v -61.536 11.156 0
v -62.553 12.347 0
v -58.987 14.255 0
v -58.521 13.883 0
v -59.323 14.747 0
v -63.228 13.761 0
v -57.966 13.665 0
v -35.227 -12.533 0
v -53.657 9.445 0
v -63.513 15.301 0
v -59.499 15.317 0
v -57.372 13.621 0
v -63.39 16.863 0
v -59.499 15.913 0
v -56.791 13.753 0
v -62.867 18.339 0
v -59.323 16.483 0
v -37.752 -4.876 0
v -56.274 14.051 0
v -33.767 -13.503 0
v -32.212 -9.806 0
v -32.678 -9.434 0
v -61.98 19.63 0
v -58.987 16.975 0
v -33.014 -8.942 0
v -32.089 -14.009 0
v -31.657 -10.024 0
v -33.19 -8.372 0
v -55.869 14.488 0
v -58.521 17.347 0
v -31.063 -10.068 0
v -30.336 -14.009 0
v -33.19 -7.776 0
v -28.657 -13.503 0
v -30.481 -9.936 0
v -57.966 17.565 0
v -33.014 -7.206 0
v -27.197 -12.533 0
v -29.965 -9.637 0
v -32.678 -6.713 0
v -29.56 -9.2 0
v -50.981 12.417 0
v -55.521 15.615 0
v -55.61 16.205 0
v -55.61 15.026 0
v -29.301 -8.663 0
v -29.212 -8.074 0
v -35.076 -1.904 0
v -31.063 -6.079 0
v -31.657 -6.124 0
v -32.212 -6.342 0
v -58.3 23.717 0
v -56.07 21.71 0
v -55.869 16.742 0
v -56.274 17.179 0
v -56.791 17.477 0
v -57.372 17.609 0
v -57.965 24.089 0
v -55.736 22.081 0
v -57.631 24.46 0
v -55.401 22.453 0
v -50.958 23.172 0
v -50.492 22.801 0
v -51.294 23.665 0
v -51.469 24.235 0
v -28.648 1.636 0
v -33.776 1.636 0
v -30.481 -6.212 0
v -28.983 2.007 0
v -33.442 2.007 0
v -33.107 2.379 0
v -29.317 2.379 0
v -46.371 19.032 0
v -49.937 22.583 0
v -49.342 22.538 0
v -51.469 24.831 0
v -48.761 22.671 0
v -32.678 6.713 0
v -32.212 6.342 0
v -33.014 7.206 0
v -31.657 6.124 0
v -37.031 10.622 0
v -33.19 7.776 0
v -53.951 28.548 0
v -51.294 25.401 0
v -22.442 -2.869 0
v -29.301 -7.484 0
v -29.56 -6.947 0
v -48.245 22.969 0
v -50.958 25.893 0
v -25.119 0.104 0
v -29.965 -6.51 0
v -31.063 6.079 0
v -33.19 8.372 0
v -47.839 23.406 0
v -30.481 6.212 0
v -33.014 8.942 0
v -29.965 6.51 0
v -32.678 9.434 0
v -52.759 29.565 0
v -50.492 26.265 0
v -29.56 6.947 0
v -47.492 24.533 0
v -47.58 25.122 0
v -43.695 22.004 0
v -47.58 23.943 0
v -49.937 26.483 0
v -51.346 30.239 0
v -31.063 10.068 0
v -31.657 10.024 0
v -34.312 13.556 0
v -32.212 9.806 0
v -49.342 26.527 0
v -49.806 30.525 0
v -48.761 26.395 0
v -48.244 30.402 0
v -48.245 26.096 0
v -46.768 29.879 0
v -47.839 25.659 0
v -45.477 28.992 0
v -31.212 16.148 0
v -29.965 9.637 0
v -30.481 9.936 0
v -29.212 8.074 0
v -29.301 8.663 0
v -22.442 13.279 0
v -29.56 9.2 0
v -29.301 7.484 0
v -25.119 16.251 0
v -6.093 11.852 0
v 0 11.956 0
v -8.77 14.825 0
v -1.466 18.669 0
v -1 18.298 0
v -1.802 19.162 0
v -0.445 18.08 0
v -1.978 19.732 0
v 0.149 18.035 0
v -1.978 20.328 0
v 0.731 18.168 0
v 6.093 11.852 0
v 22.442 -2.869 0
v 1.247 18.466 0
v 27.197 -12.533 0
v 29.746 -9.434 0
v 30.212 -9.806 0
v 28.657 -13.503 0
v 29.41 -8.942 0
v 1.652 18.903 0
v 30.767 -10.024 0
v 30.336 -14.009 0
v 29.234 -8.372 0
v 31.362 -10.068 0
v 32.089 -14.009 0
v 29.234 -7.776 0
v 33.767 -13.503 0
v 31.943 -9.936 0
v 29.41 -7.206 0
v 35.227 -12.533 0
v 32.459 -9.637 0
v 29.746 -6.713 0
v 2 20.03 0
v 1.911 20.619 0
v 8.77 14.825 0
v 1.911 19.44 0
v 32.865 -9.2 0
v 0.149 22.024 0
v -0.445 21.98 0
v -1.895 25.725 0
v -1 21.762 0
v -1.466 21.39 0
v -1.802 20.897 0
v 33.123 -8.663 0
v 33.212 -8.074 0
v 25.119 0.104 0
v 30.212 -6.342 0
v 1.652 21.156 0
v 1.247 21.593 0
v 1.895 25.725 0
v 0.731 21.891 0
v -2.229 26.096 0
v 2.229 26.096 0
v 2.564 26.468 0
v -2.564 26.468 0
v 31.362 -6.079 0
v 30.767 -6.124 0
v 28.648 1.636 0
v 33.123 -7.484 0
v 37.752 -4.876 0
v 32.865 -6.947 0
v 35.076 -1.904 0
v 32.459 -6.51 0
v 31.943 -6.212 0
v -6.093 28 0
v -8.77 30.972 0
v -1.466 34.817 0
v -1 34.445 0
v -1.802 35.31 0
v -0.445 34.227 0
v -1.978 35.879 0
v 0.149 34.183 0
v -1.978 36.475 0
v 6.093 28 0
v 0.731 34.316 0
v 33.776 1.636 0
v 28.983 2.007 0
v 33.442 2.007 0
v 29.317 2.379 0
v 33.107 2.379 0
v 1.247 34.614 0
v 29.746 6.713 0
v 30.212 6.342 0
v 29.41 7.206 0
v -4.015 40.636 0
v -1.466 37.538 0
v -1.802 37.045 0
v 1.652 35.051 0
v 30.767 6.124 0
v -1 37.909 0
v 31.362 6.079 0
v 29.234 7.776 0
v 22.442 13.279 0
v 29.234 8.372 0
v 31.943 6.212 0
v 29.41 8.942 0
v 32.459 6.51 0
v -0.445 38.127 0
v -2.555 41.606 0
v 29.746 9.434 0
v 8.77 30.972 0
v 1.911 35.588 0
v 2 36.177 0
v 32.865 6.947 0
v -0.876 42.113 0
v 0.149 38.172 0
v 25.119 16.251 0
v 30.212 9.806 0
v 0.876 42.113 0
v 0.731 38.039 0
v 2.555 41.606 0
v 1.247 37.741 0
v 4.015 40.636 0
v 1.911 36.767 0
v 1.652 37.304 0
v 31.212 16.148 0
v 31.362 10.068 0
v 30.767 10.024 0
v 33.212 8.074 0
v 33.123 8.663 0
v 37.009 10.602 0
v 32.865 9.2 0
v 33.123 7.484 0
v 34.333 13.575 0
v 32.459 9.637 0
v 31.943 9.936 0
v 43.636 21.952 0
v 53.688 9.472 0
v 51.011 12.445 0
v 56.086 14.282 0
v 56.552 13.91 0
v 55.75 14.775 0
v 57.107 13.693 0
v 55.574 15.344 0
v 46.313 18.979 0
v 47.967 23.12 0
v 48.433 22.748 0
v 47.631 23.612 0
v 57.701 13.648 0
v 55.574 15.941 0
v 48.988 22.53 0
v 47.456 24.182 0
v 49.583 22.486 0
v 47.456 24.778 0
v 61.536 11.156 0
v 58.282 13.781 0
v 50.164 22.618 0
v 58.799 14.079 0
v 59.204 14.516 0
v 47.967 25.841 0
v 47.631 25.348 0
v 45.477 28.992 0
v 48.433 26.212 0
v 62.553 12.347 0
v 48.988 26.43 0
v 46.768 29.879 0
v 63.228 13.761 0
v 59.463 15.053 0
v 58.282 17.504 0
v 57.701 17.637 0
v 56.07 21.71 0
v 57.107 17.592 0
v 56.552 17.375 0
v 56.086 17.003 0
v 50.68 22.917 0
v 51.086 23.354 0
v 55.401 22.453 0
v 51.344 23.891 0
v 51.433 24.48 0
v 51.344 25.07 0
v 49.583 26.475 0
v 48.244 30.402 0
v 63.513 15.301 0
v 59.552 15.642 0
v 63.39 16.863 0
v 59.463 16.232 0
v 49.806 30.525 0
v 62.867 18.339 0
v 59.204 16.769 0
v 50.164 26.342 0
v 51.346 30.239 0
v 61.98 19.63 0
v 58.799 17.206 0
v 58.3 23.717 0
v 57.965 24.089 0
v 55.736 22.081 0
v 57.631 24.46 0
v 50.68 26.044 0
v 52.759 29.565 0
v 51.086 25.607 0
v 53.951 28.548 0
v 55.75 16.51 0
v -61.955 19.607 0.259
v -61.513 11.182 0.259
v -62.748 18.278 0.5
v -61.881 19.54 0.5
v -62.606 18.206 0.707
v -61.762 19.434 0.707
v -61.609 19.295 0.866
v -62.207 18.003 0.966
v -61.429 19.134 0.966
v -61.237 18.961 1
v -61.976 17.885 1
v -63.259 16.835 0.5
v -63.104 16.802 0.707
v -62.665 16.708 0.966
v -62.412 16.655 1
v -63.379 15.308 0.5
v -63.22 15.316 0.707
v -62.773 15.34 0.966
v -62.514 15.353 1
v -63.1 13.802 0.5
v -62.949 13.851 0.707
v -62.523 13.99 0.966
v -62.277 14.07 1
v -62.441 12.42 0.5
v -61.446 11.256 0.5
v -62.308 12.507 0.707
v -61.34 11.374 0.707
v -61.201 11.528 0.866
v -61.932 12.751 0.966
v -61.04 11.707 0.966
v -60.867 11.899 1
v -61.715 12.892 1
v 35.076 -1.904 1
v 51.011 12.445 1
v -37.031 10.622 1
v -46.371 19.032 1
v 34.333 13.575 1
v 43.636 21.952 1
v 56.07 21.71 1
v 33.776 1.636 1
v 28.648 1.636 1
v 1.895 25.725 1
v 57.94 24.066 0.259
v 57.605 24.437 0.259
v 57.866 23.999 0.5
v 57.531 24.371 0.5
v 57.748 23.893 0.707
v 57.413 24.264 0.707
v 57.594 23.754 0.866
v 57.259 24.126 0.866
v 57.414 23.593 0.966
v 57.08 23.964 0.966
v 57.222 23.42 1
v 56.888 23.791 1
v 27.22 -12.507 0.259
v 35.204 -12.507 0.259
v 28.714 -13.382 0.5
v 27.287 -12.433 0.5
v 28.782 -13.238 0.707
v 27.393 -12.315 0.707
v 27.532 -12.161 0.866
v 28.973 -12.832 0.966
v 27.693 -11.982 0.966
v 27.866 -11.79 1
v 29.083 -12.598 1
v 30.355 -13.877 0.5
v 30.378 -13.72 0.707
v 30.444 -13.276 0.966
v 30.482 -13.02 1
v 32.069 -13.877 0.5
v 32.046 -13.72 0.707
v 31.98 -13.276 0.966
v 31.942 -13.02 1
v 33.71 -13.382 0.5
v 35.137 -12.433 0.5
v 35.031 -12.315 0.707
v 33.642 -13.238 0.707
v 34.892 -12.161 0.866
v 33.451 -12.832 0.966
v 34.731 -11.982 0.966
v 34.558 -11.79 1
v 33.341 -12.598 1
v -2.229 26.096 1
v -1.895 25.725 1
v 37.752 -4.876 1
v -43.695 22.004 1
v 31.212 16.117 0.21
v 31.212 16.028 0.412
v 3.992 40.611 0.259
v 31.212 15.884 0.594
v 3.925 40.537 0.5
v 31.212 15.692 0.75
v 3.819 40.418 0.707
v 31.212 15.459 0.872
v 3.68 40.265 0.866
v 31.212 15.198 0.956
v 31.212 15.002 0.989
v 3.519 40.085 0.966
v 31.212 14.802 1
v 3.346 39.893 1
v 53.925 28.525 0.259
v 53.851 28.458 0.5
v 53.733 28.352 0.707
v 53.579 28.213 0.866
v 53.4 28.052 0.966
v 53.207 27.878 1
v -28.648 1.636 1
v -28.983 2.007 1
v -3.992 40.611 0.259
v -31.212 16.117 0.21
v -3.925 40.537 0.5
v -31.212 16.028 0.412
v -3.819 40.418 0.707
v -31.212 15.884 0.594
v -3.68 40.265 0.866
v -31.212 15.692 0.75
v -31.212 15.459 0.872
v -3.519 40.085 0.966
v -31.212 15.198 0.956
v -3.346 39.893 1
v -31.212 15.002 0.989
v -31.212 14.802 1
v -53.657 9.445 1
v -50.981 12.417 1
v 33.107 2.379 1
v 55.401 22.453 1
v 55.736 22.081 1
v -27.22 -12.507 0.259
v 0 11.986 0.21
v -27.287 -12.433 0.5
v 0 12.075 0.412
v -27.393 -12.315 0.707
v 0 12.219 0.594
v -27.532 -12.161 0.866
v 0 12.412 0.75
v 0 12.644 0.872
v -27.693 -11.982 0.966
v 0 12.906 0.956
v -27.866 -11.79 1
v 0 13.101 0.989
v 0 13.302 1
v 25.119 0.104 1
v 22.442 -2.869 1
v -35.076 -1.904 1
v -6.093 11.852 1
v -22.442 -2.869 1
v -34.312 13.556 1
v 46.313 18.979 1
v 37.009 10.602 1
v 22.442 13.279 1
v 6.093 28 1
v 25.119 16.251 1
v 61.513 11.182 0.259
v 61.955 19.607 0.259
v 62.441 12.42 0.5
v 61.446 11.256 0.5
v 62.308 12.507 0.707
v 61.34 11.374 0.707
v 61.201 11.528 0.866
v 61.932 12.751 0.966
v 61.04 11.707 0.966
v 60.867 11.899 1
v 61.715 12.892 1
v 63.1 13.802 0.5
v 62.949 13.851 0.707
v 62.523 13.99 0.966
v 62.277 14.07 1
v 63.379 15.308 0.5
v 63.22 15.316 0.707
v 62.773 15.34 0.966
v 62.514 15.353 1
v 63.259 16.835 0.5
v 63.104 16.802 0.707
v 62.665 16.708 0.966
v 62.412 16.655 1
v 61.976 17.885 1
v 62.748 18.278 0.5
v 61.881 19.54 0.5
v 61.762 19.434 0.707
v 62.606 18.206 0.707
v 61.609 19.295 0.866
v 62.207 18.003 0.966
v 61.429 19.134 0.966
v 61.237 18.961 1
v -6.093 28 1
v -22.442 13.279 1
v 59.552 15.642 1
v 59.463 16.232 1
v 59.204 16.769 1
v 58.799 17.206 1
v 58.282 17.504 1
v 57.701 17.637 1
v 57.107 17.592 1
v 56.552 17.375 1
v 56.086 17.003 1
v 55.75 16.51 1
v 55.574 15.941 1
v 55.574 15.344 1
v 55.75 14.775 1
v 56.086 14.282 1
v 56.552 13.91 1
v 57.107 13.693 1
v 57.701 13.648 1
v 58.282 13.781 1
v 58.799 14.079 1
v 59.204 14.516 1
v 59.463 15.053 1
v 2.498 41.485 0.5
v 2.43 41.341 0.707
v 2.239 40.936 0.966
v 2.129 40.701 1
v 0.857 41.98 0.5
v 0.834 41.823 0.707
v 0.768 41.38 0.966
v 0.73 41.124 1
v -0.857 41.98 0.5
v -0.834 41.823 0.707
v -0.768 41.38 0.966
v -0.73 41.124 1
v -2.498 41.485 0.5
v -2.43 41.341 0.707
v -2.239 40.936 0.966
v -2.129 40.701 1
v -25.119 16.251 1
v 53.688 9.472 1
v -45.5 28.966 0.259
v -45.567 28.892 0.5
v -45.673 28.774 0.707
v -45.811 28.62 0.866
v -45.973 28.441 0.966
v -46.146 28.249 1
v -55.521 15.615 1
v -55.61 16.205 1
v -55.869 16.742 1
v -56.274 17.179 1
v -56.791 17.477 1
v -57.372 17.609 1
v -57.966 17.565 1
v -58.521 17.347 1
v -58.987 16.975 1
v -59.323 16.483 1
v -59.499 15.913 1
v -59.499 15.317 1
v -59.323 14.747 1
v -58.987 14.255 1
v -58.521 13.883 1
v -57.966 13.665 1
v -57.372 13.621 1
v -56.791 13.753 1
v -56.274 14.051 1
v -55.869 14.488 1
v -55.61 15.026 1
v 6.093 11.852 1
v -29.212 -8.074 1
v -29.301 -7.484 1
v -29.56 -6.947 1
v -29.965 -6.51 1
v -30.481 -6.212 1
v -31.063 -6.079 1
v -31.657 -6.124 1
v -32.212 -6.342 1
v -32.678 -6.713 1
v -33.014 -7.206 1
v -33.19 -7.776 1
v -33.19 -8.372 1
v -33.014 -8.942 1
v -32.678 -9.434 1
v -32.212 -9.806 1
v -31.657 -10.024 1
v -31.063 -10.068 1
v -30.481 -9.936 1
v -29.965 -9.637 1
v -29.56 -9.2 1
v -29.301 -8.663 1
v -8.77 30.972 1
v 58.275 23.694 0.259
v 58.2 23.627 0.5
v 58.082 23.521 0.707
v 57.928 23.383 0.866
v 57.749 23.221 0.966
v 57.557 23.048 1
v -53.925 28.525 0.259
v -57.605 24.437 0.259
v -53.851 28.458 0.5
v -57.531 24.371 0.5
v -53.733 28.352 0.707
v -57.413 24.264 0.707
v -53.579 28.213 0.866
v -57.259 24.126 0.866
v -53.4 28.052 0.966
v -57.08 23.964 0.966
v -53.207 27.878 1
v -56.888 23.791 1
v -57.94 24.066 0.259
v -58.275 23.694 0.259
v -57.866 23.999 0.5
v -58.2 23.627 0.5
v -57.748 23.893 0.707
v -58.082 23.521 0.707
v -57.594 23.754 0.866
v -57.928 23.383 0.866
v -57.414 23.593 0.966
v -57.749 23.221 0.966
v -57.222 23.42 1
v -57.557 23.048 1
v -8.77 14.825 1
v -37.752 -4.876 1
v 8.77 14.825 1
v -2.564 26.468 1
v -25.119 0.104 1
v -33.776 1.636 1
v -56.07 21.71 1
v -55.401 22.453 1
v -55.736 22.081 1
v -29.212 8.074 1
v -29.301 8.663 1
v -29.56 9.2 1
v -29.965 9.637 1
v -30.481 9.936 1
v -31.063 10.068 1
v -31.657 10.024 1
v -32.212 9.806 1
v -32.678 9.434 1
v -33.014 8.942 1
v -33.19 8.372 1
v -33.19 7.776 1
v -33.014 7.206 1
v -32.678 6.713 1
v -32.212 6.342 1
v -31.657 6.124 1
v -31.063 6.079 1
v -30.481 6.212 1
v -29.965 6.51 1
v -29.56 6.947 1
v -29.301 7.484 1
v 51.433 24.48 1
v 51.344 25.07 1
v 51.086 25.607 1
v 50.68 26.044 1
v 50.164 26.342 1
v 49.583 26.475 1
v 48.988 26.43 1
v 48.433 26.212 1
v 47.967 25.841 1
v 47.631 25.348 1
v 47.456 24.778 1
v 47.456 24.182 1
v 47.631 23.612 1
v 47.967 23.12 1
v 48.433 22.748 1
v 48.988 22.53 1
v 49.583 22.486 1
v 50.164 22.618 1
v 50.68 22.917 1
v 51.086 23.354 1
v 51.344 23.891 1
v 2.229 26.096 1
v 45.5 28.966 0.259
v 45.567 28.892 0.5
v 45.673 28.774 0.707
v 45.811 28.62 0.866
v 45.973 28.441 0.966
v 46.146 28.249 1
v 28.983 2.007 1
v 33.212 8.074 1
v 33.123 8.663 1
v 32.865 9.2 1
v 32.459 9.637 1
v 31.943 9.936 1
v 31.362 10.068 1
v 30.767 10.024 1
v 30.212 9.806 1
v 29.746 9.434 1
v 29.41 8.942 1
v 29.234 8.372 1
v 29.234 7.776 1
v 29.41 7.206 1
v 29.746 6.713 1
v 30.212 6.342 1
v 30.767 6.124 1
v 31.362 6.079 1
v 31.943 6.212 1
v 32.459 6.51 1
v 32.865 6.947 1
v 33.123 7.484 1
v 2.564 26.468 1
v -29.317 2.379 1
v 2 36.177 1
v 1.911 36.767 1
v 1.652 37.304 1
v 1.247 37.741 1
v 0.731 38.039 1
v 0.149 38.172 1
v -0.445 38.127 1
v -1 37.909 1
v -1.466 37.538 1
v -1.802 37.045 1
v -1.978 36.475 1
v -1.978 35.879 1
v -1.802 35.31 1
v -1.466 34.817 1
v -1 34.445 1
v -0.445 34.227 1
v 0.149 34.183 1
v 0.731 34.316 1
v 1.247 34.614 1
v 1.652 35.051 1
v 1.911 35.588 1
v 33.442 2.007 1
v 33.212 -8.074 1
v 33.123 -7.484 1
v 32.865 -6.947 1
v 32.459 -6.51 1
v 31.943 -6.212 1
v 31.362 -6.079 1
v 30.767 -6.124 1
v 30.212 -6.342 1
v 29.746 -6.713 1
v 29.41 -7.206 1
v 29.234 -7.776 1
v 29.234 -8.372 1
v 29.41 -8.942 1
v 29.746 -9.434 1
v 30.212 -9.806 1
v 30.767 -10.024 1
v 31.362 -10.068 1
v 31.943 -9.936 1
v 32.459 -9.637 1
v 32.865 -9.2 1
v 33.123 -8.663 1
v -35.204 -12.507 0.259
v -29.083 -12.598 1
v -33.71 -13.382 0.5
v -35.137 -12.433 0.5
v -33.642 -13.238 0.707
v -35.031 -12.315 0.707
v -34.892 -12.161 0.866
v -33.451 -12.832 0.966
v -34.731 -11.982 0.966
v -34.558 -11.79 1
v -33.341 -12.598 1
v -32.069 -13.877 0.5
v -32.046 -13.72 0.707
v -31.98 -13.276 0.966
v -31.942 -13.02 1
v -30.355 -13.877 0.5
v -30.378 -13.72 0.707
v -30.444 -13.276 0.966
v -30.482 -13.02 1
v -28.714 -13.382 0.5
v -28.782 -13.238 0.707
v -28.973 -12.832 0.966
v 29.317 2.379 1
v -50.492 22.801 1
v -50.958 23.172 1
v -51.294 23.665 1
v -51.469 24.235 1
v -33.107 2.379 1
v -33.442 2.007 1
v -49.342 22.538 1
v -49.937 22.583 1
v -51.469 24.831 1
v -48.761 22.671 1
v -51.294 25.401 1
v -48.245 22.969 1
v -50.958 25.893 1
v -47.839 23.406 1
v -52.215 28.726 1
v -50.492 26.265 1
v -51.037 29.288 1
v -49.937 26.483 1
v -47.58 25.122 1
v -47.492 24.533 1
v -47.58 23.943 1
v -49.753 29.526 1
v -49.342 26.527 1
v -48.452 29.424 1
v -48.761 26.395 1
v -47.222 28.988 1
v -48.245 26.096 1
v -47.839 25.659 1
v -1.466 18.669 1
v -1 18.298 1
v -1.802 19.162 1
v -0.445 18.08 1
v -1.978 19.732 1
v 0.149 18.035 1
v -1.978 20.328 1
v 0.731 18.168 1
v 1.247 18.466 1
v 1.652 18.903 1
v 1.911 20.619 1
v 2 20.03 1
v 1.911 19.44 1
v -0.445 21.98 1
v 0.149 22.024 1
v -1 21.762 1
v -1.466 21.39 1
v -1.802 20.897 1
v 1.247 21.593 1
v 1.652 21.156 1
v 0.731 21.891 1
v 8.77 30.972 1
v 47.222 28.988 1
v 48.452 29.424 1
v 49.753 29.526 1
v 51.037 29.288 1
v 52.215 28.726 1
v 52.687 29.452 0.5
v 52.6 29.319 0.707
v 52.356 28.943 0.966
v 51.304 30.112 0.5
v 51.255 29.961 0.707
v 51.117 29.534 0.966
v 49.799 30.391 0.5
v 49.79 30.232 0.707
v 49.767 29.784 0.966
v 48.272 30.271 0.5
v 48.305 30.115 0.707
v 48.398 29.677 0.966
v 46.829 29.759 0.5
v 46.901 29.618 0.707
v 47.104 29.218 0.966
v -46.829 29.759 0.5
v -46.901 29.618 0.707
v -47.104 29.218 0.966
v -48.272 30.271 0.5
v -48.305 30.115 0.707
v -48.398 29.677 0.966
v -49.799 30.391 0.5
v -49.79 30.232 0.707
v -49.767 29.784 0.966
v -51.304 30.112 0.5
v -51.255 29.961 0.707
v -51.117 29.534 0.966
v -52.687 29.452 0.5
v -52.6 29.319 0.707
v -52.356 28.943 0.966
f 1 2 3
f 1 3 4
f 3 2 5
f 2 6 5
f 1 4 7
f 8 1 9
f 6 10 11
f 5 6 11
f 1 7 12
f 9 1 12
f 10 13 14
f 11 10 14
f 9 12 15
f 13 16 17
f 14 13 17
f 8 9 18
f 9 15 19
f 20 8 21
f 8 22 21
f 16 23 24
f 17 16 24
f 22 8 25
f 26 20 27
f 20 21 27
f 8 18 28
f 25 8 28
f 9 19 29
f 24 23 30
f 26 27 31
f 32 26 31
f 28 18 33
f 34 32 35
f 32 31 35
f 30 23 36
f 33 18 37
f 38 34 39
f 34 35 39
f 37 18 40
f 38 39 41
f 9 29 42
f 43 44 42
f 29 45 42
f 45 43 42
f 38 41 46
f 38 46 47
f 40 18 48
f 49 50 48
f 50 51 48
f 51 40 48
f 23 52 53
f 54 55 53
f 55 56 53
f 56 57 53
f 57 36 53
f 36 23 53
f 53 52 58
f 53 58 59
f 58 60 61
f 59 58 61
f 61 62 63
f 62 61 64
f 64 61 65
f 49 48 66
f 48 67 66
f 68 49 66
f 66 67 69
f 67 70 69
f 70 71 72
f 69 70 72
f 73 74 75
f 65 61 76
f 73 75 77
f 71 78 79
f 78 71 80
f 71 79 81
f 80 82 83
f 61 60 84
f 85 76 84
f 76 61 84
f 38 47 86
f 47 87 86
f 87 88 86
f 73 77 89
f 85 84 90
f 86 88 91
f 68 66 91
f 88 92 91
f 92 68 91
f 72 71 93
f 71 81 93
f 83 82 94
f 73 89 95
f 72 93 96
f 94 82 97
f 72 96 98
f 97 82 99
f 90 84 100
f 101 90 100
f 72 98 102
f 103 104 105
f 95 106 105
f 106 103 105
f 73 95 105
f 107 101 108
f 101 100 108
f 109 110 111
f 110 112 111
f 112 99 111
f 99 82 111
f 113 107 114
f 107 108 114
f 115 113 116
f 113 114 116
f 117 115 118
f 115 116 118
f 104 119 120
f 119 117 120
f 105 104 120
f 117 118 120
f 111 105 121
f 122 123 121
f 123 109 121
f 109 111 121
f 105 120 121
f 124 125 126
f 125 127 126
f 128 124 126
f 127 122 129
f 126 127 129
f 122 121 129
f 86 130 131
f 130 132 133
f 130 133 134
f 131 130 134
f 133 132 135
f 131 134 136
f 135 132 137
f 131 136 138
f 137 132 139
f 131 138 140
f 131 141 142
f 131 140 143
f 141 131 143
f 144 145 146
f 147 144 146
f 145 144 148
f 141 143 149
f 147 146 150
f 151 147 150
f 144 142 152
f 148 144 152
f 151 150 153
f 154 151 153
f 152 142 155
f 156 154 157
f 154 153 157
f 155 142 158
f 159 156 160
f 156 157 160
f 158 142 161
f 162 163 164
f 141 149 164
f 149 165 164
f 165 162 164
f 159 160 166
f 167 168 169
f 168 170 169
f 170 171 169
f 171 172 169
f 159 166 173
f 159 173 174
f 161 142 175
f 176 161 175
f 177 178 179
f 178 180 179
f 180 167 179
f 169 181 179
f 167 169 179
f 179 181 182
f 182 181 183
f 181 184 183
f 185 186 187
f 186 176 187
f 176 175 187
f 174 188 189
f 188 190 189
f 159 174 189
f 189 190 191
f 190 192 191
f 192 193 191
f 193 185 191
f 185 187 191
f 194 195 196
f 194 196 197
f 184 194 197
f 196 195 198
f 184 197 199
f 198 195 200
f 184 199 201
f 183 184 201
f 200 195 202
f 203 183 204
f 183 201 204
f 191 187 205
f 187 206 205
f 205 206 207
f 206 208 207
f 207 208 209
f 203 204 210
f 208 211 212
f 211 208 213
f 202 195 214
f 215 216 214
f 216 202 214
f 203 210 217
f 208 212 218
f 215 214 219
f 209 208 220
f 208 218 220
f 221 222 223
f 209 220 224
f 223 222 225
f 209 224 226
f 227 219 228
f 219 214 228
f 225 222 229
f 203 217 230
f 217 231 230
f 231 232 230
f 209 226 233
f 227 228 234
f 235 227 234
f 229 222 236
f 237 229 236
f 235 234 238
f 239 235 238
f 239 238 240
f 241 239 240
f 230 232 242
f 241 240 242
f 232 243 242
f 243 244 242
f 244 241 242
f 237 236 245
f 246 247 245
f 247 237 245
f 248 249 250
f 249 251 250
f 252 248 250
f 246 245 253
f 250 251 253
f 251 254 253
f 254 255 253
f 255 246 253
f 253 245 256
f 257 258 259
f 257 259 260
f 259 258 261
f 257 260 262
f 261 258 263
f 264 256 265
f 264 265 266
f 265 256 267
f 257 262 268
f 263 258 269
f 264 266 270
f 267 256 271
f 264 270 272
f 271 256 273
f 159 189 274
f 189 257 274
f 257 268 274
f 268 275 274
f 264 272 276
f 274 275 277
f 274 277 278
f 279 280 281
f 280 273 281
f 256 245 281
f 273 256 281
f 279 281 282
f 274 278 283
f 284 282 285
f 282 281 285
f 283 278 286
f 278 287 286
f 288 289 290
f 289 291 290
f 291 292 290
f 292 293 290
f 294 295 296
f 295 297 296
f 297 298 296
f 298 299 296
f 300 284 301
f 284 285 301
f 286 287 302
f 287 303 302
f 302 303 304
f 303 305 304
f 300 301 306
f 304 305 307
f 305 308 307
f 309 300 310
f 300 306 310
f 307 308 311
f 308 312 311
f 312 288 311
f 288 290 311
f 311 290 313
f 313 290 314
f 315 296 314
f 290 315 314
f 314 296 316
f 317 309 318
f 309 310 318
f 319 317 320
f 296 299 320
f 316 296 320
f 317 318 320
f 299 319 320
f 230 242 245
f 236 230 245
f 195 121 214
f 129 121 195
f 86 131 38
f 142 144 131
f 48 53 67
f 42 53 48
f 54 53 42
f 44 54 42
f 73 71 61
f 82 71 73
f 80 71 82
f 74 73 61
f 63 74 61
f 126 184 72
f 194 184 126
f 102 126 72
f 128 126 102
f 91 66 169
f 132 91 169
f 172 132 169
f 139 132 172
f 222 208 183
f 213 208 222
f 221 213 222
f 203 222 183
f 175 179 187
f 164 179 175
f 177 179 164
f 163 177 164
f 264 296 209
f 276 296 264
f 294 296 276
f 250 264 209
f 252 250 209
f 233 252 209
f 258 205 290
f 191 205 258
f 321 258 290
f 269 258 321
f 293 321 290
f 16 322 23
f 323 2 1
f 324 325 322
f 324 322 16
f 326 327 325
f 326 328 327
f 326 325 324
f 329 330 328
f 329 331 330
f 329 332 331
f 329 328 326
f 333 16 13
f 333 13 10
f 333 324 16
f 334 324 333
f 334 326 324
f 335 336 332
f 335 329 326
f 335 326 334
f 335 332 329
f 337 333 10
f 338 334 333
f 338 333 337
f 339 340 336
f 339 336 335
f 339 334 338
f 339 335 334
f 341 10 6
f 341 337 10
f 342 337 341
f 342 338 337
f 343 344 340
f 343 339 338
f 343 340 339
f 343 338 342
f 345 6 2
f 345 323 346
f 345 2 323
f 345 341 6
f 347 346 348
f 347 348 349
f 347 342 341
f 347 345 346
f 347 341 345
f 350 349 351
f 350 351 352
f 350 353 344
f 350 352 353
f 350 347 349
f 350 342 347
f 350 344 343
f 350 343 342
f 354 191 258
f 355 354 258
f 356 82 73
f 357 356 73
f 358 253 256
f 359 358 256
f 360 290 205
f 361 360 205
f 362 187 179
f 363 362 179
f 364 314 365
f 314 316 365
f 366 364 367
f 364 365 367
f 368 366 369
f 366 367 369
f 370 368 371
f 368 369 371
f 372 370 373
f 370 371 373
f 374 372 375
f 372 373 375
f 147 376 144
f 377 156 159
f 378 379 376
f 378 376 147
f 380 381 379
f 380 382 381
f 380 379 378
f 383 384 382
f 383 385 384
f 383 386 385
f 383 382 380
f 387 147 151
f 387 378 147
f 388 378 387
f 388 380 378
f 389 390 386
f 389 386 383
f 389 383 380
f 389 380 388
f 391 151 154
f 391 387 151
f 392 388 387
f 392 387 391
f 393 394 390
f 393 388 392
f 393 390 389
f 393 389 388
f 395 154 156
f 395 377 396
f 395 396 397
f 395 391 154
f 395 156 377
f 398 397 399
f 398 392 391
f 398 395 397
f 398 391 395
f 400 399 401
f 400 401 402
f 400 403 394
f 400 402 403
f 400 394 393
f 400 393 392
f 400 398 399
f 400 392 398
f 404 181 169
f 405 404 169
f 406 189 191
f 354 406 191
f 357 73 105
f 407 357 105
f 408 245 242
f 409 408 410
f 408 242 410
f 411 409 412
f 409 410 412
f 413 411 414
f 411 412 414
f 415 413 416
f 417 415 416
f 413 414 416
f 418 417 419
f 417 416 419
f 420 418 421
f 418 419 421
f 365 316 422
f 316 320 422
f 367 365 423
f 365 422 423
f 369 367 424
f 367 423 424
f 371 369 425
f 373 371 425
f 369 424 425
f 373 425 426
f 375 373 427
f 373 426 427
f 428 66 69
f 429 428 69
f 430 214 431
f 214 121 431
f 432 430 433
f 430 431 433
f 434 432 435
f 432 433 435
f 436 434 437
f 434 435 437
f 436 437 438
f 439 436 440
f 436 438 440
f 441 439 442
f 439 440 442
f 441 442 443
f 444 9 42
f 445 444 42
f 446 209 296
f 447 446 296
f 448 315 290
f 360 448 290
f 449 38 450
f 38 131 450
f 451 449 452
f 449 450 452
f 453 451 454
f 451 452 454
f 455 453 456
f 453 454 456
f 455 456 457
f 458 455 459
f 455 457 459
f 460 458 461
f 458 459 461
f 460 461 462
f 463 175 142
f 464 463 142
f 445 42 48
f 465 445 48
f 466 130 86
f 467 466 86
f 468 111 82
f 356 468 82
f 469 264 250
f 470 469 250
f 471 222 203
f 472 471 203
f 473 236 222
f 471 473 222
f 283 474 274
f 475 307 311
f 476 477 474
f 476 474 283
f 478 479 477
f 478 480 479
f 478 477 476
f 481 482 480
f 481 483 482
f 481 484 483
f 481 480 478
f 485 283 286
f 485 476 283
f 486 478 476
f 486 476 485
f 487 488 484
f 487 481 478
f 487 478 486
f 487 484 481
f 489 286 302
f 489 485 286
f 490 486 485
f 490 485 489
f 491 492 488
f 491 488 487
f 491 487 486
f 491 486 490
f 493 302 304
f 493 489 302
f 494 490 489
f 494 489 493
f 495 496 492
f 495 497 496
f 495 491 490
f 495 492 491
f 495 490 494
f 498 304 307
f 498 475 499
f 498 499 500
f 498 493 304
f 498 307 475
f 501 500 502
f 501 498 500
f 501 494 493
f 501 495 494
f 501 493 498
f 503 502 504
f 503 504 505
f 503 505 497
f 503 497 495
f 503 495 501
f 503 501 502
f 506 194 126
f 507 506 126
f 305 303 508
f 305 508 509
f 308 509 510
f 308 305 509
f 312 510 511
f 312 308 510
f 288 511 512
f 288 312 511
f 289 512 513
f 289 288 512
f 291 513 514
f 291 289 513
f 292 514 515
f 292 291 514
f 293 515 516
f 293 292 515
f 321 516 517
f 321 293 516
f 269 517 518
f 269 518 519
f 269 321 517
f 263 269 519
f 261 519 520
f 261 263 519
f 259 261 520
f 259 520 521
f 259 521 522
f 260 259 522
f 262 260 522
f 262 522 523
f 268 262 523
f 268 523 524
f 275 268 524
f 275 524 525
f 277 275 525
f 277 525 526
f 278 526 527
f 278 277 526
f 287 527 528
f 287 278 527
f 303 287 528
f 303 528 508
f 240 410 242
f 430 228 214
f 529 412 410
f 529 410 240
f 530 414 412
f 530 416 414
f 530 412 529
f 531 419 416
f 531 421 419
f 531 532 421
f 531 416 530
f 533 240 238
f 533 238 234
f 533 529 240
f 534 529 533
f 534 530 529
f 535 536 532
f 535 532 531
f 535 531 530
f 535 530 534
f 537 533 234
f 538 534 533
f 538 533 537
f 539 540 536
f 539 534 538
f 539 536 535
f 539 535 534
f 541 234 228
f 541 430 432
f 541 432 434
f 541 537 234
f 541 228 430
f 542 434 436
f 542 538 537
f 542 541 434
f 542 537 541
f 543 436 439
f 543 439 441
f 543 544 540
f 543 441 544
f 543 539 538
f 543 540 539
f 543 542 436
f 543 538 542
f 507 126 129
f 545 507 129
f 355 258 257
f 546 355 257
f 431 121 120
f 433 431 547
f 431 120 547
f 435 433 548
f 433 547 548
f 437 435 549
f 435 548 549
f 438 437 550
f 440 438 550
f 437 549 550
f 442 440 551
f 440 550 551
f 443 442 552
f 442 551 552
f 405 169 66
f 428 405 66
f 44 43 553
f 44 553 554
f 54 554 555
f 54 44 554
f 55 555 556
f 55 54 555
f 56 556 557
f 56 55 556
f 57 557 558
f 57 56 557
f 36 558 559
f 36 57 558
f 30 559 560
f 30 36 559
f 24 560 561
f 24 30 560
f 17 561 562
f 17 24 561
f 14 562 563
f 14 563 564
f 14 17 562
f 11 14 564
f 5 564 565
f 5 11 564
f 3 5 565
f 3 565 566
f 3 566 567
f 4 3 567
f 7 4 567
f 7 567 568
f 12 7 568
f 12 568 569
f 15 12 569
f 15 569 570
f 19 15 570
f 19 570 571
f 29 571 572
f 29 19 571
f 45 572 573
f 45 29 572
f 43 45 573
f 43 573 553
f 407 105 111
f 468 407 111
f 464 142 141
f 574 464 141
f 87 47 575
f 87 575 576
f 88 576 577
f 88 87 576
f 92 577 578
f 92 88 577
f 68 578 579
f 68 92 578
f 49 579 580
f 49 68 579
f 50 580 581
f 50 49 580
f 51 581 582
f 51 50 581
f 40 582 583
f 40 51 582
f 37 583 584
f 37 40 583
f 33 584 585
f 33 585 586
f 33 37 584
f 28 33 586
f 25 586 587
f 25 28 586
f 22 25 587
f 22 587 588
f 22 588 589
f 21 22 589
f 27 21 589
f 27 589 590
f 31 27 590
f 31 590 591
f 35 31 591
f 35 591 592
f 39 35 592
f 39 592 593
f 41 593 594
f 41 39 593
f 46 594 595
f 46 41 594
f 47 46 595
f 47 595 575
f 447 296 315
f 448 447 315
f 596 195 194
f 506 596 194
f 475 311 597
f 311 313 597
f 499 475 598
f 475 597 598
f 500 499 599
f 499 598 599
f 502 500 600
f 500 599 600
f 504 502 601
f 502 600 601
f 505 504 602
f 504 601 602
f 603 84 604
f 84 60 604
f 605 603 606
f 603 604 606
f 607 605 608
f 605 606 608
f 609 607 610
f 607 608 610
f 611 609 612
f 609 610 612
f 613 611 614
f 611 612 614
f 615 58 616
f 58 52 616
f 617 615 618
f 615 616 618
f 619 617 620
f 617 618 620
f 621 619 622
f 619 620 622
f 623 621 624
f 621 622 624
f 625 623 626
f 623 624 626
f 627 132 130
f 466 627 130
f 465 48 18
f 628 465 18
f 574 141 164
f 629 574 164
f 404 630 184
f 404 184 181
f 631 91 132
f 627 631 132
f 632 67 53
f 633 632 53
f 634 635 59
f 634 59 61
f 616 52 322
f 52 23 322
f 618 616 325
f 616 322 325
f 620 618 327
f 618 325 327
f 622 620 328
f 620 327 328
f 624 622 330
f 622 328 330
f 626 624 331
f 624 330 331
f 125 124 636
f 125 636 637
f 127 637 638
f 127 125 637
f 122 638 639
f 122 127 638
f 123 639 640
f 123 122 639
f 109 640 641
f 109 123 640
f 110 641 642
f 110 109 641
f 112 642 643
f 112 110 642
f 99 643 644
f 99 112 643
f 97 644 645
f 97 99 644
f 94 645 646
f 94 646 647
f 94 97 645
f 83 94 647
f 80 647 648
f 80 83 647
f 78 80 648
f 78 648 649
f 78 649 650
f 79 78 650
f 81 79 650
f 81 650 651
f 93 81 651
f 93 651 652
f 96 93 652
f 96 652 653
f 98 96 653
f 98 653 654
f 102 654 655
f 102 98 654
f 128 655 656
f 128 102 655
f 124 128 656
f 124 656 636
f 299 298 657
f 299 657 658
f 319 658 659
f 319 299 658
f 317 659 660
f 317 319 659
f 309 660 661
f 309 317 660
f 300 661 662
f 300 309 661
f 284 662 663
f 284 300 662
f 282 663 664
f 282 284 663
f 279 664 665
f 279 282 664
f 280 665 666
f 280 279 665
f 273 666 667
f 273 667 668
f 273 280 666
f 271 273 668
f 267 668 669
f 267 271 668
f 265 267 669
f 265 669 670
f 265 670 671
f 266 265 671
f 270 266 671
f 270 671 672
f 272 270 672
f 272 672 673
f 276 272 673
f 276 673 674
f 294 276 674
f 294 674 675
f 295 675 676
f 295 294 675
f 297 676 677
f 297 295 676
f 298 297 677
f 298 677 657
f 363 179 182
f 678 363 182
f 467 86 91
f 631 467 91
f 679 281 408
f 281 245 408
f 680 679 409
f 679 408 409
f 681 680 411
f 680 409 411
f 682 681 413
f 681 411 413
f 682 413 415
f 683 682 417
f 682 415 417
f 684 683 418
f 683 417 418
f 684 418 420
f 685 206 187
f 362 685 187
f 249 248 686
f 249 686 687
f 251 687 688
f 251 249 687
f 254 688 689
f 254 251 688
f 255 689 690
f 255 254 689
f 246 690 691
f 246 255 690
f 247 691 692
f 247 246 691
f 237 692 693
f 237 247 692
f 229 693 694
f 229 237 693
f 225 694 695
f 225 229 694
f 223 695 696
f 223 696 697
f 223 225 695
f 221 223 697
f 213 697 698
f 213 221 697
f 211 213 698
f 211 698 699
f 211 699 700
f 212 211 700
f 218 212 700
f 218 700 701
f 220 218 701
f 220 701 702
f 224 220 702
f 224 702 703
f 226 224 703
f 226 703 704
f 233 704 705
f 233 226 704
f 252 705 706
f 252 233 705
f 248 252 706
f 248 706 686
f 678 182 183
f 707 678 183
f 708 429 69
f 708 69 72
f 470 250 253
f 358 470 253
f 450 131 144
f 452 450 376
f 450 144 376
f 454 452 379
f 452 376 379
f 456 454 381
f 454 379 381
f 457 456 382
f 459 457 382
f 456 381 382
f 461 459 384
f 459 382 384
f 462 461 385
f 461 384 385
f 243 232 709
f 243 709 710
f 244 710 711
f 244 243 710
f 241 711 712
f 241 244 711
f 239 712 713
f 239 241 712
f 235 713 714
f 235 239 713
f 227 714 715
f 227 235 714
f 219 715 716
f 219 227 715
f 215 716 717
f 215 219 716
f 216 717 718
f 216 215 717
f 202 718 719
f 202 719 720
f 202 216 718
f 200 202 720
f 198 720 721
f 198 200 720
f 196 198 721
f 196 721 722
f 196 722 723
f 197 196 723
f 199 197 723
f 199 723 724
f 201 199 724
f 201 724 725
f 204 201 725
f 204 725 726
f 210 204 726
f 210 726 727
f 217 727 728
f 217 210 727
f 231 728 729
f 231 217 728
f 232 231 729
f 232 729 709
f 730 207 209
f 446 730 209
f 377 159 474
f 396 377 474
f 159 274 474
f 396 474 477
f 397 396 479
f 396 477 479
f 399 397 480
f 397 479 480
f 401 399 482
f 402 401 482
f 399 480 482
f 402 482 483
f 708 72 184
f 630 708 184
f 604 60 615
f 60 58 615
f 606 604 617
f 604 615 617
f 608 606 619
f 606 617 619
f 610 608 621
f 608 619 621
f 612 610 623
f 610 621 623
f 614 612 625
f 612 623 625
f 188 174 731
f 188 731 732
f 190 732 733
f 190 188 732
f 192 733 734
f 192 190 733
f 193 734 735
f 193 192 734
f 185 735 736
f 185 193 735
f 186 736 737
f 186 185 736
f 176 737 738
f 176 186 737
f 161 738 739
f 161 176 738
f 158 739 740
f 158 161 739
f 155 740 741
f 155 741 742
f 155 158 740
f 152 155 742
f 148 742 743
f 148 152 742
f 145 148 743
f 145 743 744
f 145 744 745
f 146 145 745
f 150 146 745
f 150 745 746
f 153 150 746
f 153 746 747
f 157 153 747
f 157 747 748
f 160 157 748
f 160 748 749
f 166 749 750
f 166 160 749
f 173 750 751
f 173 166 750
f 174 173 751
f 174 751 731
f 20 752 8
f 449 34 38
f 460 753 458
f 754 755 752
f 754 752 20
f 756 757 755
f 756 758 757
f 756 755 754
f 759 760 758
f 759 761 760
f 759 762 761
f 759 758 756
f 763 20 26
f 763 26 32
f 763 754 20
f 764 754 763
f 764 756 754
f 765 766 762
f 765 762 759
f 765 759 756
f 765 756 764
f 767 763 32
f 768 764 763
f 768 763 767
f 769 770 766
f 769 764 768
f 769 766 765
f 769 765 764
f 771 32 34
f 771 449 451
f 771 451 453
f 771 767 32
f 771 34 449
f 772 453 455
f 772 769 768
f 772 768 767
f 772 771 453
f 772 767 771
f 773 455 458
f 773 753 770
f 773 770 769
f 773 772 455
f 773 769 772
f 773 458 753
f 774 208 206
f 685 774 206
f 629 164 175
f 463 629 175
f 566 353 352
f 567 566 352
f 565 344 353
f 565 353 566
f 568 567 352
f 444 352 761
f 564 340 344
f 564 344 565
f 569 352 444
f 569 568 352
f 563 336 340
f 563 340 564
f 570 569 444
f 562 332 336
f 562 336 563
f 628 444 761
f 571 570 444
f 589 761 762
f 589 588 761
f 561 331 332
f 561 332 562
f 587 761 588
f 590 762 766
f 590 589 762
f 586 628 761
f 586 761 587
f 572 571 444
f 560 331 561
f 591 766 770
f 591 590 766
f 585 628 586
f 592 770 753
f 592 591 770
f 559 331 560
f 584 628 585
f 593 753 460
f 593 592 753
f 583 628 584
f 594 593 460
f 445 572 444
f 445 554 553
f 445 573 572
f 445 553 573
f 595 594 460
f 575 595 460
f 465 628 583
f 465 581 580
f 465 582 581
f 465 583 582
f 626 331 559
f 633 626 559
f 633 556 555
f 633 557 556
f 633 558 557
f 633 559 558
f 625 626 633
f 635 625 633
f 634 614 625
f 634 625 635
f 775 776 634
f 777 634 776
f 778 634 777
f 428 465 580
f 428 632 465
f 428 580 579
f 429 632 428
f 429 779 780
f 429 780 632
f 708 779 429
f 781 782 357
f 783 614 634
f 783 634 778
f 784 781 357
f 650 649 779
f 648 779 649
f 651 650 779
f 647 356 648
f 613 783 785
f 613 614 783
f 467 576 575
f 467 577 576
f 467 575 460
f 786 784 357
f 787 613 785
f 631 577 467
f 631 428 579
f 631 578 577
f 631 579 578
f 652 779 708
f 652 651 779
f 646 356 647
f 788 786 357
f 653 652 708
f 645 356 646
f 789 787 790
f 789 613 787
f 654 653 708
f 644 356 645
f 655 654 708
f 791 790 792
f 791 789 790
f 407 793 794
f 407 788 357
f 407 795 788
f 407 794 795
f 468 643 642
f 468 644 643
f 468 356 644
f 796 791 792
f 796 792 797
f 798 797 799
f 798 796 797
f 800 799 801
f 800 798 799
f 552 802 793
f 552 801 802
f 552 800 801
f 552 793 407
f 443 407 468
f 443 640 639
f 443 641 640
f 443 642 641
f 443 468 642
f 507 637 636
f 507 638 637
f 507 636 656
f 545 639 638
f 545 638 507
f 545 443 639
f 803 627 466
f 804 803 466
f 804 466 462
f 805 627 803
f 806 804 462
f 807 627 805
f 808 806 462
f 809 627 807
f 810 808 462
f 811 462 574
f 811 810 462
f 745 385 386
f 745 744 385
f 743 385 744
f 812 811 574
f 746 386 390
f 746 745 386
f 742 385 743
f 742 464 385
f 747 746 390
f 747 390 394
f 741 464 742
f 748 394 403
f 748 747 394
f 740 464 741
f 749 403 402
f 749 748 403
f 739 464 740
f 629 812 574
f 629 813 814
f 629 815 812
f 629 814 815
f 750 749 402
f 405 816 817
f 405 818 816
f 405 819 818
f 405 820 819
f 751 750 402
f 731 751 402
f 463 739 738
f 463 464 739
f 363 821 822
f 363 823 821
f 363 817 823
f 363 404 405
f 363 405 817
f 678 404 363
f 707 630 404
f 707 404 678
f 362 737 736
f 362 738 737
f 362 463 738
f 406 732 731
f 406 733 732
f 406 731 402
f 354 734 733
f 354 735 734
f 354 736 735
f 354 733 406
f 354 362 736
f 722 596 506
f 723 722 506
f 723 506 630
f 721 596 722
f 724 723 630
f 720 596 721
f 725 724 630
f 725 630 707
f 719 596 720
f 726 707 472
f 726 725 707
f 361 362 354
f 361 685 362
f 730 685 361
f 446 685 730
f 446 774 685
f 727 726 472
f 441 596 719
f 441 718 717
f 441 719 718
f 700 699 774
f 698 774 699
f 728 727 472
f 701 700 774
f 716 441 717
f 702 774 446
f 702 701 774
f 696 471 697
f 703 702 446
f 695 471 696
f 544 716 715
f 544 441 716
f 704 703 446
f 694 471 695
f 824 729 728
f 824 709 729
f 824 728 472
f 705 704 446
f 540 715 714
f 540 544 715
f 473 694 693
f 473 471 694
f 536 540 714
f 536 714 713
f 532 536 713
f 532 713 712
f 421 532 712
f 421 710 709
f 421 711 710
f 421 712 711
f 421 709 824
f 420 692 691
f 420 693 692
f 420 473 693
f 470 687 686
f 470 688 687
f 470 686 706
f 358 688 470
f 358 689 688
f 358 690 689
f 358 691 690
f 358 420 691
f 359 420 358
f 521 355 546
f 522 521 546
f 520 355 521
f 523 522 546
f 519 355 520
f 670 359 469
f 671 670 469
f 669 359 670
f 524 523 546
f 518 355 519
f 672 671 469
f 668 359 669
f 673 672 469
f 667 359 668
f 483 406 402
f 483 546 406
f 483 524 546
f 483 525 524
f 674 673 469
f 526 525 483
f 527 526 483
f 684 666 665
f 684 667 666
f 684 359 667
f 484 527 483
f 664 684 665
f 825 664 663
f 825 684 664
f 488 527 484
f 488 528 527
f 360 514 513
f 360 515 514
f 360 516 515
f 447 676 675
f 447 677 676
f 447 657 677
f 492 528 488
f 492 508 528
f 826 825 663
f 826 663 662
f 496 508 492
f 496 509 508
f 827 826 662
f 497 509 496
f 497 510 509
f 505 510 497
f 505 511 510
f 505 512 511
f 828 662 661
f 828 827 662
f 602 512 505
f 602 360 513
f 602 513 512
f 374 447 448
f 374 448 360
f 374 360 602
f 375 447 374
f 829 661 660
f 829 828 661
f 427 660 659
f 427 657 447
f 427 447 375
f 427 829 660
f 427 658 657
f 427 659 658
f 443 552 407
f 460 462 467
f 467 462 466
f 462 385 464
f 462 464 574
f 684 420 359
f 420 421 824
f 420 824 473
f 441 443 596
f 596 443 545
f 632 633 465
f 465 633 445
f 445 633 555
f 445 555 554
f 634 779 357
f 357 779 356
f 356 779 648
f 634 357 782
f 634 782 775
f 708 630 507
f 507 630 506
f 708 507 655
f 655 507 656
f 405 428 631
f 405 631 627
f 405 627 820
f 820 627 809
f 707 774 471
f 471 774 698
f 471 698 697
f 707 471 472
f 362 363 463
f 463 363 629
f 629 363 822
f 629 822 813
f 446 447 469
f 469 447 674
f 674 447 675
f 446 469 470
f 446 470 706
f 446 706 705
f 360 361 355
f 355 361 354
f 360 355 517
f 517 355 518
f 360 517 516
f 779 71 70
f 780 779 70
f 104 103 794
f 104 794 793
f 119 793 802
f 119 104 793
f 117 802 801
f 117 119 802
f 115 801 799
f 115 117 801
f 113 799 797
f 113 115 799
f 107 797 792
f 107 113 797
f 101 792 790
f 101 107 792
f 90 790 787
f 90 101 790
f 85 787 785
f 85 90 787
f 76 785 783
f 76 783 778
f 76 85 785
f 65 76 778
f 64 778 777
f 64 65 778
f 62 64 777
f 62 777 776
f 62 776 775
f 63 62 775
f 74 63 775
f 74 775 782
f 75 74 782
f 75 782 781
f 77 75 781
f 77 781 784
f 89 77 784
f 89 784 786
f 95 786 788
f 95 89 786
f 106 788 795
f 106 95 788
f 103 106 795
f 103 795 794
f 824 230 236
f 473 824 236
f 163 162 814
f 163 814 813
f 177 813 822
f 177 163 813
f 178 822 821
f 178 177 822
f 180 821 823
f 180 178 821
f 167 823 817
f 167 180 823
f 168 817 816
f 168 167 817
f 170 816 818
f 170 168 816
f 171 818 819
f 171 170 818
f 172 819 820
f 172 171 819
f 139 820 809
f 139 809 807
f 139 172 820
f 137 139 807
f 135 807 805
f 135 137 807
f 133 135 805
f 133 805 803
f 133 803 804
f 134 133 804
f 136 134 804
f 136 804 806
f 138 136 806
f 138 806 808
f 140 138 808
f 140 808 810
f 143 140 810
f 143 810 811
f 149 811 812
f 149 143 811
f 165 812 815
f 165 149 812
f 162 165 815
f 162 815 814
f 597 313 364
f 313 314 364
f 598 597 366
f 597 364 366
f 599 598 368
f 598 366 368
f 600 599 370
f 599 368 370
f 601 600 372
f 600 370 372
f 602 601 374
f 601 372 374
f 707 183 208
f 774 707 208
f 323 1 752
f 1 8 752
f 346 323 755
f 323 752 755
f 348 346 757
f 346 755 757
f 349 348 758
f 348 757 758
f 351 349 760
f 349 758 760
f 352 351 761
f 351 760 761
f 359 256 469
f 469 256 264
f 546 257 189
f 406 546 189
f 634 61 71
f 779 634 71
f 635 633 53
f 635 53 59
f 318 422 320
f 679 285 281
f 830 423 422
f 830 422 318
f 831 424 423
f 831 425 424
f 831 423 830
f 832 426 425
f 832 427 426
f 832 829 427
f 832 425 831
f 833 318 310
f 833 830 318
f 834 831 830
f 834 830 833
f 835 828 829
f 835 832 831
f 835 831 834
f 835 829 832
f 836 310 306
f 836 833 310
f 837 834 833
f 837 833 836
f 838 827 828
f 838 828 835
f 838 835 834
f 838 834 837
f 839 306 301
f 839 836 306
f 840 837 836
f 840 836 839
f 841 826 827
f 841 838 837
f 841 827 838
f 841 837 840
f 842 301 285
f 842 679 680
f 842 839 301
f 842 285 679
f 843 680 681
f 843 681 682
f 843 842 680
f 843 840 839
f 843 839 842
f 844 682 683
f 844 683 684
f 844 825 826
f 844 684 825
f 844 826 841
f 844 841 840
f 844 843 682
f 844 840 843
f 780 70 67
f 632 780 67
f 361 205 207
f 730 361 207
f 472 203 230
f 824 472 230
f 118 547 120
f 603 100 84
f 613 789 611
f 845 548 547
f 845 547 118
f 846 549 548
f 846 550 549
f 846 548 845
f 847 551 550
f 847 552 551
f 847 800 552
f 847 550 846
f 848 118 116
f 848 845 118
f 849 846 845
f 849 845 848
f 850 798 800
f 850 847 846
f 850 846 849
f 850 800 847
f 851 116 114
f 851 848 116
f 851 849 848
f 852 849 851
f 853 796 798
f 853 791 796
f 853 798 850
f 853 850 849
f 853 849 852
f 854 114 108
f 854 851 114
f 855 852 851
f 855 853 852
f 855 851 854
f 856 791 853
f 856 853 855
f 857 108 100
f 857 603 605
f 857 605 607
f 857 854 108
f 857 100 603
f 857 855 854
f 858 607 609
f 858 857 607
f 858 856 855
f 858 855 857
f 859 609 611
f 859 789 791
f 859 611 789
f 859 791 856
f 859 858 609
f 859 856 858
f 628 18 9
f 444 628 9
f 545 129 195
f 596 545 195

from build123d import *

# Parameters (mm, degrees)
F0_R     = 2
F1_DEPTH = 1
F2_R     = 0.99999


# Not quite as in the source:
# - a fillet or chamfer is up to 0.001 mm smaller than in the source, because OpenCascade refuses the exact size


with BuildPart() as f1:
    # F0 (on Top) → F1 (new body)
    with BuildSketch(Plane.XY):
        with BuildLine():
            Line((-56.070427214, 21.7097375971), (-58.2998616904, 23.7171294162))
            Line((-58.2998616904, 23.7171294162), (-61.9800800254, 19.6298328761))
            ThreePointArc((-61.9800800254, 19.6298328761), (-63.5129882811, 15.3010335004), (-61.5359947107, 11.156180285))
            Line((-61.5359947107, 11.156180285), (-35.2268663082, -12.5326653305))
            ThreePointArc((-35.2268663082, -12.5326653305), (-31.2120826701, -14.0737963776), (-27.1972990319, -12.5326653305))
            Line((-27.1972990319, -12.5326653305), (0, 11.9558927118))
            Line((0, 11.9558927118), (27.1972990319, -12.5326653305))
            ThreePointArc((27.1972990319, -12.5326653305), (31.2120826701, -14.0737963776), (35.2268663082, -12.5326653305))
            Line((35.2268663082, -12.5326653305), (61.5359947107, 11.156180285))
            ThreePointArc((61.5359947107, 11.156180285), (63.5129882811, 15.3010335004), (61.9800800254, 19.6298328761))
            Line((61.9800800254, 19.6298328761), (58.2998616904, 23.7171294162))
            Line((58.2998616904, 23.7171294162), (56.070427214, 21.7097375971))
            Line((56.070427214, 21.7097375971), (33.7760824497, 1.6358194063))
            Line((33.7760824497, 1.6358194063), (31.2120826701, -0.6728163648))
            Line((31.2120826701, -0.6728163648), (28.6480828904, 1.6358194063))
            Line((28.6480828904, 1.6358194063), (1.8948691733, 25.7245212353))
            Line((1.8948691733, 25.7245212353), (0, 27.4306691023))
            Line((0, 27.4306691023), (-1.8948691733, 25.7245212353))
            Line((-1.8948691733, 25.7245212353), (-28.6480828904, 1.6358194063))
            Line((-28.6480828904, 1.6358194063), (-31.2120826701, -0.6728163648))
            Line((-31.2120826701, -0.6728163648), (-33.7760824497, 1.6358194063))
            Line((-33.7760824497, 1.6358194063), (-56.070427214, 21.7097375971))
        make_face()
        with Locations((-31.2120826701, -8.0737963776)):
            Circle(F0_R, mode=Mode.SUBTRACT)
        Polygon((-53.6574585069, 9.4448453424), (-50.9809360815, 12.4174246443), (-35.0758352357, -1.9035924822), (-37.7523576611, -4.8761717841), align=None, mode=Mode.SUBTRACT)
        Polygon((-6.0931870421, 11.8520933749), (-22.4423732026, -2.868779965), (-25.118895628, 0.1037993369), (-8.7697094675, 14.8246726768), align=None, mode=Mode.SUBTRACT)
        with Locations((31.2120826701, -8.0737963776)):
            Circle(F0_R, mode=Mode.SUBTRACT)
        Polygon((22.4423732026, -2.868779965), (6.0931870421, 11.8520933749), (8.7697094675, 14.8246726768), (25.118895628, 0.1037993369), align=None, mode=Mode.SUBTRACT)
        Polygon((37.7523576611, -4.8761717841), (35.0758352357, -1.9035924822), (51.0113683193, 12.4448259544), (53.6878907447, 9.4722466525), align=None, mode=Mode.SUBTRACT)
        with Locations((-57.5212110725, 15.6150492379)):
            Circle(F0_R, mode=Mode.SUBTRACT)
        with Locations((0, 20.0296890894)):
            Circle(F0_R, mode=Mode.SUBTRACT)
        with Locations((57.5516433104, 15.6424505479)):
            Circle(F0_R, mode=Mode.SUBTRACT)
        Polygon((-55.7358619108, 22.0813100098), (-57.9652963872, 24.0887018289), (-58.2998616904, 23.7171294162), (-56.070427214, 21.7097375971), align=None)
        Polygon((-57.6307310841, 24.4602742417), (-57.9652963872, 24.0887018289), (-55.7358619108, 22.0813100098), (-55.4012966076, 22.4528824226), align=None)
        with BuildLine():
            Line((-53.9505127491, 28.5475707818), (-57.6307310841, 24.4602742417))
            Line((-57.6307310841, 24.4602742417), (-55.4012966076, 22.4528824226))
            Line((-55.4012966076, 22.4528824226), (-33.1069518433, 2.3789642318))
            Line((-33.1069518433, 2.3789642318), (-31.2120826701, 0.6728163648))
            Line((-31.2120826701, 0.6728163648), (-29.3172134968, 2.3789642318))
            Line((-29.3172134968, 2.3789642318), (-2.5639997796, 26.4676660607))
            Line((-2.5639997796, 26.4676660607), (0, 28.7763018319))
            Line((0, 28.7763018319), (2.5639997796, 26.4676660607))
            Line((2.5639997796, 26.4676660607), (29.3172134968, 2.3789642318))
            Line((29.3172134968, 2.3789642318), (31.2120826701, 0.6728163648))
            Line((31.2120826701, 0.6728163648), (33.1069518433, 2.3789642318))
            Line((33.1069518433, 2.3789642318), (55.4012966076, 22.4528824226))
            Line((55.4012966076, 22.4528824226), (57.6307310841, 24.4602742417))
            Line((57.6307310841, 24.4602742417), (53.9505127491, 28.5475707818))
            ThreePointArc((53.9505127491, 28.5475707818), (49.8056595337, 30.5245643522), (45.4768601581, 28.9916560965))
            Line((45.4768601581, 28.9916560965), (31.2120826701, 16.1475927553))
            Line((31.2120826701, 16.1475927553), (4.0147836382, 40.6361507976))
            ThreePointArc((4.0147836382, 40.6361507976), (0, 42.1772818447), (-4.0147836382, 40.6361507976))
            Line((-4.0147836382, 40.6361507976), (-31.2120826701, 16.1475927553))
            Line((-31.2120826701, 16.1475927553), (-45.4768601581, 28.9916560965))
            ThreePointArc((-45.4768601581, 28.9916560965), (-49.8056595337, 30.5245643522), (-53.9505127491, 28.5475707818))
        make_face()
        with Locations((-31.2120826701, 8.0737963776)):
            Circle(F0_R, mode=Mode.SUBTRACT)
        with Locations((31.2120826701, 8.0737963776)):
            Circle(F0_R, mode=Mode.SUBTRACT)
        Polygon((-46.3710360561, 19.0317138545), (-43.6945136306, 22.0042931564), (-34.3115040691, 13.5557933995), (-37.0313460748, 10.6222192229), align=None, mode=Mode.SUBTRACT)
        with Locations((-49.4916437962, 24.5327871436)):
            Circle(F0_R, mode=Mode.SUBTRACT)
        Polygon((-22.4423732026, 13.2788127903), (-25.118895628, 16.2513920922), (-8.7697094675, 30.9722654321), (-6.0931870421, 27.9996861302), align=None, mode=Mode.SUBTRACT)
        Polygon((6.0931870421, 27.9996861302), (8.7697094675, 30.9722654321), (25.118895628, 16.2513920922), (22.4423732026, 13.2788127903), align=None, mode=Mode.SUBTRACT)
        Polygon((37.0092128356, 10.6022903648), (34.3326904102, 13.5748696667), (43.6361429708, 21.9517359782), (46.3126653962, 18.9791566763), align=None, mode=Mode.SUBTRACT)
        with Locations((49.4332731364, 24.4802299654)):
            Circle(F0_R, mode=Mode.SUBTRACT)
        with Locations((0, 36.1772818447)):
            Circle(F0_R, mode=Mode.SUBTRACT)
        Polygon((-31.2120826701, 0), (-33.4415171465, 2.0073918191), (-33.7760824497, 1.6358194063), (-31.2120826701, -0.6728163648), (-28.6480828904, 1.6358194063), (-28.9826481936, 2.0073918191), align=None)
        Polygon((-33.1069518433, 2.3789642318), (-33.4415171465, 2.0073918191), (-31.2120826701, 0), (-28.9826481936, 2.0073918191), (-29.3172134968, 2.3789642318), (-31.2120826701, 0.6728163648), align=None)
        Polygon((0, 28.1034854671), (-2.2294344764, 26.096093648), (-1.8948691733, 25.7245212353), (0, 27.4306691023), (1.8948691733, 25.7245212353), (2.2294344764, 26.096093648), align=None)
        Polygon((-2.5639997796, 26.4676660607), (-2.2294344764, 26.096093648), (0, 28.1034854671), (2.2294344764, 26.096093648), (2.5639997796, 26.4676660607), (0, 28.7763018319), align=None)
        Polygon((31.2120826701, 0), (28.9826481936, 2.0073918191), (28.6480828904, 1.6358194063), (31.2120826701, -0.6728163648), (33.7760824497, 1.6358194063), (33.4415171465, 2.0073918191), align=None)
        Polygon((29.3172134968, 2.3789642318), (28.9826481936, 2.0073918191), (31.2120826701, 0), (33.4415171465, 2.0073918191), (33.1069518433, 2.3789642318), (31.2120826701, 0.6728163648), align=None)
        Polygon((57.9652963872, 24.0887018289), (55.7358619108, 22.0813100098), (56.070427214, 21.7097375971), (58.2998616904, 23.7171294162), align=None)
        Polygon((57.9652963872, 24.0887018289), (57.6307310841, 24.4602742417), (55.4012966076, 22.4528824226), (55.7358619108, 22.0813100098), align=None)
    extrude(amount=F1_DEPTH)

    # F2 (radius 1 in the source; OpenCascade refuses exactly that, so slightly less here)
    f2_edges = [f1.edges().sort_by_distance(p)[0] for p in [
        (-63.512988, 15.301034, 1),
        (-48.381431, -0.688243, 1),
        (-31.212083, -14.073796, 1),
        (-13.59865, -0.288386, 1),
        (13.59865, -0.288386, 1),
        (31.212083, -14.073796, 1),
        (48.381431, -0.688243, 1),
        (63.512988, 15.301034, 1),
        (57.965296, 24.088702, 1),
        (49.80566, 30.524564, 1),
        (38.344471, 22.569624, 1),
        (17.613433, 28.391872, 1),
        (0, 42.177282, 1),
        (-17.613433, 28.391872, 1),
        (-38.344471, 22.569624, 1),
        (-49.80566, 30.524564, 1),
        (-57.965296, 24.088702, 1),
    ]]
    fillet(f2_edges, radius=F2_R)


solid = f1.part
